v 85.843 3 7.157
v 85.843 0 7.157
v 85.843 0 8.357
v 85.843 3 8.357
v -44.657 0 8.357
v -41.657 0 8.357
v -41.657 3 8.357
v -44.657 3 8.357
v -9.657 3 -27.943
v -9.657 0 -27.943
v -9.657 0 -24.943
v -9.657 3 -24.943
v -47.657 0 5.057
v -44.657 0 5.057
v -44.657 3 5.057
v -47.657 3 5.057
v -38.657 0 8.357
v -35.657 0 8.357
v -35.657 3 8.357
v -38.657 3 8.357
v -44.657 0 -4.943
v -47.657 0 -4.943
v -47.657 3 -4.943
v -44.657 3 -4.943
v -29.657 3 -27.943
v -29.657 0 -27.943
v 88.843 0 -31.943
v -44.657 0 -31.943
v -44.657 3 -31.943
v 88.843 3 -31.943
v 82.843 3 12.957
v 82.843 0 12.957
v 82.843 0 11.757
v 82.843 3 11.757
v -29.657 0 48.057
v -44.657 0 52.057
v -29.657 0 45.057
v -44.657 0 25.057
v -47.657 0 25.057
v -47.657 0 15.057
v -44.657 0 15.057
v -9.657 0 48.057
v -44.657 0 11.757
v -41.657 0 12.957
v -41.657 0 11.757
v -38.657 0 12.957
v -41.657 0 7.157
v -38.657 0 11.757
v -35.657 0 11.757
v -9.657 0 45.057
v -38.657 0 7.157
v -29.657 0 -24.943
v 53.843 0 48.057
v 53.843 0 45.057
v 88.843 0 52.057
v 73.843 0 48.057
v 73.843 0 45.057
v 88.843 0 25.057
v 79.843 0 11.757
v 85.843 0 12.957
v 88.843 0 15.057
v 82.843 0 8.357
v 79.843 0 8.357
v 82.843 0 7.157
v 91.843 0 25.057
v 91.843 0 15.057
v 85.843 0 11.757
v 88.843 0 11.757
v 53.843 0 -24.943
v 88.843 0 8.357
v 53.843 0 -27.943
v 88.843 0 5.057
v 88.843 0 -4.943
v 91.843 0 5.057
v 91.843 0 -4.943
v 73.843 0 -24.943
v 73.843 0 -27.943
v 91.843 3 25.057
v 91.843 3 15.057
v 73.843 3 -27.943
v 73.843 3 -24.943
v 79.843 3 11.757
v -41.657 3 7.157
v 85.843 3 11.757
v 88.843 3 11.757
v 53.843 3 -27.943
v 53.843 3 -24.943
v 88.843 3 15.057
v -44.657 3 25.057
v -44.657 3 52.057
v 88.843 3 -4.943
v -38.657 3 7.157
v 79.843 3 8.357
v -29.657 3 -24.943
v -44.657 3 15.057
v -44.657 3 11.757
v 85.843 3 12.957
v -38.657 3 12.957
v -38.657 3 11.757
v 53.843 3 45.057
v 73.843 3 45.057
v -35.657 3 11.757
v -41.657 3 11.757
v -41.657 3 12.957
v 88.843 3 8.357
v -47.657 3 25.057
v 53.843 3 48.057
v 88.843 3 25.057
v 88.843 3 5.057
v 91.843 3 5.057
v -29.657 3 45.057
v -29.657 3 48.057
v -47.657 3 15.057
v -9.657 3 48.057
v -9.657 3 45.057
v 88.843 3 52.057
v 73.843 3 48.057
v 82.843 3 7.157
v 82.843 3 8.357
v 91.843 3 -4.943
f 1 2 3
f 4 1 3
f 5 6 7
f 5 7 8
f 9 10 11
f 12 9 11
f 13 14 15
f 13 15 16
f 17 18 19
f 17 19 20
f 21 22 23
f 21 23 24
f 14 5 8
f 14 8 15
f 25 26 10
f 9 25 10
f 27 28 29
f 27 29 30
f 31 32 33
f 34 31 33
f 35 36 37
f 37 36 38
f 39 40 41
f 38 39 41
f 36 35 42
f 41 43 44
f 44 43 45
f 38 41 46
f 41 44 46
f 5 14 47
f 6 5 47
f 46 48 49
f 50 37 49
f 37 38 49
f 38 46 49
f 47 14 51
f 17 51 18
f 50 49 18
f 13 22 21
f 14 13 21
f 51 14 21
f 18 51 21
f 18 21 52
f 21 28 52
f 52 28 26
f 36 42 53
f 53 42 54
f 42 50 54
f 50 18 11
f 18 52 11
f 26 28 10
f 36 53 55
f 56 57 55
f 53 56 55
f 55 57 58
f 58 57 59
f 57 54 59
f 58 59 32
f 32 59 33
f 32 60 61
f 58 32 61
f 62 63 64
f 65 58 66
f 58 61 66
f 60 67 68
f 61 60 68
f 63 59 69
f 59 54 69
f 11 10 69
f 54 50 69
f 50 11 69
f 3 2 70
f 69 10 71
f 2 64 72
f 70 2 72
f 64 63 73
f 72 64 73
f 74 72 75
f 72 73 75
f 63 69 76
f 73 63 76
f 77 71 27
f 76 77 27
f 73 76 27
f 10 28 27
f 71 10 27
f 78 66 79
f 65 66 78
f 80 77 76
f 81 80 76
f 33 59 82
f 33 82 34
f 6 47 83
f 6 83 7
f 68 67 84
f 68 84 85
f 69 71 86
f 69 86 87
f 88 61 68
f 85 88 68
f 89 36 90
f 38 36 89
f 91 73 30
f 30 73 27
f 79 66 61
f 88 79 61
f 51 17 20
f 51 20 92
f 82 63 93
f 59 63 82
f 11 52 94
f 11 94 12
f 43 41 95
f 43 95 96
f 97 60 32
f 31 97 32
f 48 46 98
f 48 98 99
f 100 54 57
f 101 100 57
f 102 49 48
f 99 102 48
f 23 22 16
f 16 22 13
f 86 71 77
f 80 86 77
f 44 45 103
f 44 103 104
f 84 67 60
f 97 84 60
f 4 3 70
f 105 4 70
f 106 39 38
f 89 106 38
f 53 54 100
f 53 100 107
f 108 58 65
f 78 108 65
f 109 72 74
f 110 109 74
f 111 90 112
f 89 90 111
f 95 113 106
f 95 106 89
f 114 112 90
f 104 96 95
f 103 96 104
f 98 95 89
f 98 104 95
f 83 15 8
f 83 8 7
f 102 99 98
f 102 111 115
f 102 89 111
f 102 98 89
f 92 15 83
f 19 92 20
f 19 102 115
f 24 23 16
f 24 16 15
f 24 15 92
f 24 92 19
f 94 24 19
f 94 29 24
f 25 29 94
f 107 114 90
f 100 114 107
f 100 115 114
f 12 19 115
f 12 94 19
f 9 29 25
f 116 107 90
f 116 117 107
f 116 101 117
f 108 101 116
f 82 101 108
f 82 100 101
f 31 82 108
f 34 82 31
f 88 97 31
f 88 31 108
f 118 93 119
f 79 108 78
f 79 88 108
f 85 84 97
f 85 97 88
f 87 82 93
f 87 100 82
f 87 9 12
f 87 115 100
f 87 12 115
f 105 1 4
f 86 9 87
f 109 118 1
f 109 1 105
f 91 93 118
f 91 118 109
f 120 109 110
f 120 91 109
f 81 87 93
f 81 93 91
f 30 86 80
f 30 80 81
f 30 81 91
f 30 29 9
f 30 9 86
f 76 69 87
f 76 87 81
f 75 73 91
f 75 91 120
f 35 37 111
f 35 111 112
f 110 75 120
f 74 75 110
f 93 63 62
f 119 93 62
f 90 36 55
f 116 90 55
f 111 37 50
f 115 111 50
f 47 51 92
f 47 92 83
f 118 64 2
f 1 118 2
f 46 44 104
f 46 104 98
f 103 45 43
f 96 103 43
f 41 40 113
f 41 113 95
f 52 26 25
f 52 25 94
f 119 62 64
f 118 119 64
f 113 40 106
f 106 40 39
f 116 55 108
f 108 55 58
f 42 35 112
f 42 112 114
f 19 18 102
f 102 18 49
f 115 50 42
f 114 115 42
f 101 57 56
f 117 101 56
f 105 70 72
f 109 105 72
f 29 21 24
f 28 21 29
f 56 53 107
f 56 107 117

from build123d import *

# Parameters (mm, degrees)
SKETCH1_W           = 133.500000388
SKETCH1_H           = 84
BOSS_EXTRUDE1_DEPTH = 3
SKETCH2_W           = 20
SKETCH2_H           = 3
CUT_EXTRUDE1_DEPTH  = 104.014399147
SKETCH3_W           = 3
SKETCH3_H           = 30
BOSS_EXTRUDE2_DEPTH = 3
SKETCH4_W           = 3
SKETCH4_H           = 3.4
CUT_EXTRUDE2_DEPTH  = 106.612611798


with BuildPart() as part:
    # Sketch1 → Boss-Extrude1 (new body)
    with BuildSketch(Plane(origin=(0, 0, 0), x_dir=(1, 0, 0), z_dir=(0, 1, 0))):
        with Locations((22.092889694, -10.056770433)):
            Rectangle(SKETCH1_W, SKETCH1_H)
    extrude(amount=BOSS_EXTRUDE1_DEPTH)

    # Sketch2 → Cut-Extrude1 (cut, through all)
    with BuildSketch(Plane.XZ):
        with Locations((63.842889888, 46.556770433)):
            Rectangle(SKETCH2_W, SKETCH2_H)
        with Locations((-19.6571105, 46.556770433)):
            Rectangle(SKETCH2_W, SKETCH2_H)
        with Locations((-19.6571105, -26.443229567)):
            Rectangle(SKETCH2_W, SKETCH2_H)
        with Locations((63.842889888, -26.443229567)):
            Rectangle(SKETCH2_W, SKETCH2_H)
    extrude(amount=-CUT_EXTRUDE1_DEPTH, mode=Mode.SUBTRACT)

    # Sketch3 → Boss-Extrude2 (add, through all)
    with BuildSketch(Plane.XZ):
        with Locations((90.342889888, 10.056770433)):
            Rectangle(SKETCH3_W, SKETCH3_H)
        with Locations((-46.1571105, 10.056770433)):
            Rectangle(SKETCH3_W, SKETCH3_H)
    extrude(amount=-BOSS_EXTRUDE2_DEPTH)

    # Sketch4 → Cut-Extrude2 (cut, symmetric)
    with BuildSketch(Plane.XZ):
        Polygon((88.842889888, 8.356770433), (88.842889888, 5.056770433), (91.842889888, 5.056770433), (91.842889888, 15.056770433), (88.842889888, 15.056770433), (88.842889888, 11.756770433), align=None)
        with Locations((87.342889888, 10.056770433)):
            Rectangle(SKETCH4_W, SKETCH4_H)
        Polygon((85.842889888, 7.156770433), (85.842889888, 8.356770433), (85.842889888, 11.756770433), (85.842889888, 12.956770433), (82.842889888, 12.956770433), (82.842889888, 11.756770433), (82.842889888, 8.356770433), (82.842889888, 7.156770433), align=None)
        with Locations((81.342889888, 10.056770433)):
            Rectangle(SKETCH4_W, SKETCH4_H)
    cut_extrude2 = extrude(amount=CUT_EXTRUDE2_DEPTH, both=True, mode=Mode.SUBTRACT)

    # Mirror1: Cut-Extrude2 across plane
    add(cut_extrude2.mirror(Plane(origin=(22.092889694, 0, 0), x_dir=(0, 0, 1), z_dir=(1, 0, 0))), mode=Mode.SUBTRACT)


solid = part.part
